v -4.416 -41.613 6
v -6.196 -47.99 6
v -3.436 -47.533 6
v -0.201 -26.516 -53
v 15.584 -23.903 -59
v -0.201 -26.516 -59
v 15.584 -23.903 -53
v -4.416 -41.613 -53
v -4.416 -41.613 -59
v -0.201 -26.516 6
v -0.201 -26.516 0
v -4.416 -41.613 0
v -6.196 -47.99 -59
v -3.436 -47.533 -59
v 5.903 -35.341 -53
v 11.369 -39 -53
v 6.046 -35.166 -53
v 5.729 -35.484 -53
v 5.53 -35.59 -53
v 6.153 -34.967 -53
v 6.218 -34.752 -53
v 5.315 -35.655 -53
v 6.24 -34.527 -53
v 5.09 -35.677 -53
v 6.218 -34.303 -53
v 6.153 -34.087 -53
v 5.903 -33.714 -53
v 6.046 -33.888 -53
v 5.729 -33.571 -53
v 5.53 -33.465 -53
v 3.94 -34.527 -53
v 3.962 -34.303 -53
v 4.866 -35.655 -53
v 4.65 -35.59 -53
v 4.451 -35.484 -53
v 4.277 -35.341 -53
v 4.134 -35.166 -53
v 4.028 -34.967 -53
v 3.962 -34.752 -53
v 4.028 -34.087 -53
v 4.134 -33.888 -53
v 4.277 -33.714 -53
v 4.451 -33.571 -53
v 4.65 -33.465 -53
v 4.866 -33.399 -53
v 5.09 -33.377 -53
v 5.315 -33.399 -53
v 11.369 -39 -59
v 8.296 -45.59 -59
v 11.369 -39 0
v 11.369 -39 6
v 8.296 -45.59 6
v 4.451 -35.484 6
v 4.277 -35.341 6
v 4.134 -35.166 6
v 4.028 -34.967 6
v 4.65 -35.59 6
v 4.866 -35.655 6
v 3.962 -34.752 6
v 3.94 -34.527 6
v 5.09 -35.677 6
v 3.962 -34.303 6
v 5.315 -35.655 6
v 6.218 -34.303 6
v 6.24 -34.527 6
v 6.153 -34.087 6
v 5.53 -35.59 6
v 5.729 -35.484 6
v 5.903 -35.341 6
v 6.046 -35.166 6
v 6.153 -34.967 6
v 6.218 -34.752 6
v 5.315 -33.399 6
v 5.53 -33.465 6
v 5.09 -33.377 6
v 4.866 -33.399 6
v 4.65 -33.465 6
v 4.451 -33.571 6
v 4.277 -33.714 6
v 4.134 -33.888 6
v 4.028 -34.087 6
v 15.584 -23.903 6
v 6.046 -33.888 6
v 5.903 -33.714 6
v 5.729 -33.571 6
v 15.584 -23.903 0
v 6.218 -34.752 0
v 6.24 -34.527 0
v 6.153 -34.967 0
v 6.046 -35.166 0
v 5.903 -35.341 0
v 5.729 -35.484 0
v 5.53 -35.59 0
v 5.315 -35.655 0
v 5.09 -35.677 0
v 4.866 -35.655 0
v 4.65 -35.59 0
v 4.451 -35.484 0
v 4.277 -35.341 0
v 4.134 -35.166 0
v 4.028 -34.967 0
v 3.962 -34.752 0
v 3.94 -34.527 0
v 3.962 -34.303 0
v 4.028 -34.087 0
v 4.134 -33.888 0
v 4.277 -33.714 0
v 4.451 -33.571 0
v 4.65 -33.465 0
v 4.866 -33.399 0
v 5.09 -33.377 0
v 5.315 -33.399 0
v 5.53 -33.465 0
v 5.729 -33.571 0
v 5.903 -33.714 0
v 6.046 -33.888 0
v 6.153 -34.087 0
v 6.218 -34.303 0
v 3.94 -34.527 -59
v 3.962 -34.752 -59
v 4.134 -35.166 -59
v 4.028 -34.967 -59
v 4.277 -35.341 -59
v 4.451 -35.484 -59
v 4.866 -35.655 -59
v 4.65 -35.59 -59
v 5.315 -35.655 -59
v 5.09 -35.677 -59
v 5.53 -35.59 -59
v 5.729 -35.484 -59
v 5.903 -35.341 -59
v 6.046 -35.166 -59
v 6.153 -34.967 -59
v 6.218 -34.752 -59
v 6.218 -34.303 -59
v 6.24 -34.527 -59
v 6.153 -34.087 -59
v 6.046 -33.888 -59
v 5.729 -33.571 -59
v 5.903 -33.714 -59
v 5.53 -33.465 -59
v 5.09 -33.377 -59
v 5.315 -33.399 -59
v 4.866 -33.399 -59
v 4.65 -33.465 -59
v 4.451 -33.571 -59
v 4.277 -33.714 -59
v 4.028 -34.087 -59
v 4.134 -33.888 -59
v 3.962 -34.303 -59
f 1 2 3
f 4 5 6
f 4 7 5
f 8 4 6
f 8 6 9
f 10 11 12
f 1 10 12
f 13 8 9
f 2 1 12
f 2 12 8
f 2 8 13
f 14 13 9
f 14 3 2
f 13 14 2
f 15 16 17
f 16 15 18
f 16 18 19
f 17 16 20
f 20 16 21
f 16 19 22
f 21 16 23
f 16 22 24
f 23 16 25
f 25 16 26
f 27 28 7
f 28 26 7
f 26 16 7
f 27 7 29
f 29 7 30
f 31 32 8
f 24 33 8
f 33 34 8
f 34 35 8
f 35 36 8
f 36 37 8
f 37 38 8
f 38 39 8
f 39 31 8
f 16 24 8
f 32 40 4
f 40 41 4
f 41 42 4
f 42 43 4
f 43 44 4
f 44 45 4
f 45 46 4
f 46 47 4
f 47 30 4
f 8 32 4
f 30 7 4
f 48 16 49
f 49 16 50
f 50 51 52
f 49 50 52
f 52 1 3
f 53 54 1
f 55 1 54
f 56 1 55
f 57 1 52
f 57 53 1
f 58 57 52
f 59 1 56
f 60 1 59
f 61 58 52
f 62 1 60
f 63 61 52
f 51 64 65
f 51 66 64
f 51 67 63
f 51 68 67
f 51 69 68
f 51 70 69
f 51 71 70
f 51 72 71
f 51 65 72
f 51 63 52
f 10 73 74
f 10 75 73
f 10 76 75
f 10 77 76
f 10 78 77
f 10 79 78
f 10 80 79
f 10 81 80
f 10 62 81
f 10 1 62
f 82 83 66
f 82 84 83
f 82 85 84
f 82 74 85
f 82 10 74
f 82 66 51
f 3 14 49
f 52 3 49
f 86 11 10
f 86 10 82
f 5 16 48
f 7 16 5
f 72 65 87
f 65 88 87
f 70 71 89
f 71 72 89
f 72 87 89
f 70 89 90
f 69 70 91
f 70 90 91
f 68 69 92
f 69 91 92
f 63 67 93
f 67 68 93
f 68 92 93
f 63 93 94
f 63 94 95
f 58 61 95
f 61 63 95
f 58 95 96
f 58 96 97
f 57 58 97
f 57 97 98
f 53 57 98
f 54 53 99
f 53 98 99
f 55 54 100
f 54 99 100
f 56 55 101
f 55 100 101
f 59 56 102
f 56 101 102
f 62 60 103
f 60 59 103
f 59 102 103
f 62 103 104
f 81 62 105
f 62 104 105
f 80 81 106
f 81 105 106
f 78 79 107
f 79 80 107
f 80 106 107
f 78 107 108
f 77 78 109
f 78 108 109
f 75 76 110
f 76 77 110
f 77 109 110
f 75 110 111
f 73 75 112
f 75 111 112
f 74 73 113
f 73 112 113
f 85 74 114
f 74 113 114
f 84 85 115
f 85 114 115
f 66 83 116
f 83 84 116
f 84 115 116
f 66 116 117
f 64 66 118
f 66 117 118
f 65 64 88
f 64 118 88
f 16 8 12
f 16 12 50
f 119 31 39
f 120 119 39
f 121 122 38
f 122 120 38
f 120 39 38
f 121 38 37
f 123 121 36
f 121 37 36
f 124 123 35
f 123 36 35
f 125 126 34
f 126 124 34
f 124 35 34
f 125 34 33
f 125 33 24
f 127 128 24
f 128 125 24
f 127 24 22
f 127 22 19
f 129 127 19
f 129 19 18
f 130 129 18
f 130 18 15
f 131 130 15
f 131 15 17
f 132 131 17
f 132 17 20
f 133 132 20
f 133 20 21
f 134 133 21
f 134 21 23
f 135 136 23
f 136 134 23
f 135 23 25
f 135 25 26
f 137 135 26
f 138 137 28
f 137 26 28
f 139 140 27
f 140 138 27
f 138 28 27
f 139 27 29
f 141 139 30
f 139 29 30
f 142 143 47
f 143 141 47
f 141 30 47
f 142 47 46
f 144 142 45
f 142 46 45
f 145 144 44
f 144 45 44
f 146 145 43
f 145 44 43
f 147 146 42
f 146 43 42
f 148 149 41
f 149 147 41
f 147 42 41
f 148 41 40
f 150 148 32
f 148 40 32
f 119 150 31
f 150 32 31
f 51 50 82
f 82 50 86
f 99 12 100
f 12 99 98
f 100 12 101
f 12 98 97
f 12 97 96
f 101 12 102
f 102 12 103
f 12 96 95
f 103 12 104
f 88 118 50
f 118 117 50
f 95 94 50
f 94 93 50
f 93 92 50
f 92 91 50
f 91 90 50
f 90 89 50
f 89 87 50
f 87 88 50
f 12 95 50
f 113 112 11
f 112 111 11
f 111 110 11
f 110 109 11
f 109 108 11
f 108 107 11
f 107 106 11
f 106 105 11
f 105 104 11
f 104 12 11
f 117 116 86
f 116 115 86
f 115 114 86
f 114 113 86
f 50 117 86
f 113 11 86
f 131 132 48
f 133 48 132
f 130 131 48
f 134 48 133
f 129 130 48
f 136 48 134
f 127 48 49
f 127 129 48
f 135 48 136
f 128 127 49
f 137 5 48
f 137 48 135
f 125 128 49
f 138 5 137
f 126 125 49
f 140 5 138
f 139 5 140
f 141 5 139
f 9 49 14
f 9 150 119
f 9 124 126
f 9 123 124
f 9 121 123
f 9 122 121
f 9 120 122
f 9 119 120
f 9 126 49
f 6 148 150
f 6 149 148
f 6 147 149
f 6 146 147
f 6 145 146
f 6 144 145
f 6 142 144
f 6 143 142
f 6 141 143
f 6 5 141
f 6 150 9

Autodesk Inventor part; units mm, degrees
ref_plane "YZ Plane" through (0, 0, 0) normal (1, 0, 0) x (0, 1, 0)
ref_plane "XZ Plane" through (0, 0, 0) normal (0, 1, 0) x (-1, 0, 0)
ref_plane "XY Plane" through (0, 0, 0) normal (0, 0, 1) x (1, 0, 0)
ref_plane "작업 평면1" through (0, 0, 0) normal (0, 0, 1) x (1, 0, 0)
sketch "스케치1" plane through (0, 0, 0) normal (0, 0, 1) x (1, 0, 0)
  circle A0 centre (5.0902, -34.5274) radius 1.15 projected
  arc A1 (-17.0321, 89.7044) -> (-16.6881, 73.0594) centre (-9.9807, 81.5241) ccw projected
  line L0 (-16.6881, 73.0594) -> (-0.201, -26.5164) projected
  line L1 (-0.201, -26.5164) -> (-4.4157, -41.6132) projected
  line L2 (-4.4157, -41.6132) -> (11.3694, -38.9996) projected
  line L3 (11.3694, -38.9996) -> (15.5841, -23.9028) projected
  line L4 (15.5841, -23.9028) -> (-0.903, 75.673) projected
  arc A2 (-0.903, 75.673) -> (-5.9423, 91.5406) centre (-9.9807, 81.5241) ccw projected
  arc A3 (-5.9423, 91.5406) -> (-7.3028, 90.4498) centre (-6.3162, 90.6132) ccw projected
  line L5 (-7.3028, 90.4498) -> (-5.9358, 82.1938) projected
  arc A4 (-14.0257, 80.8544) -> (-5.9358, 82.1938) centre (-9.9807, 81.5241) ccw projected
  line L6 (-14.0257, 80.8544) -> (-15.3926, 89.1104) projected
  arc A5 (-15.3926, 89.1104) -> (-17.0321, 89.7044) centre (-16.3792, 88.947) ccw projected
  circle A6 centre (-14.6376, 75.0192) radius 1.3 projected
  circle A7 centre (-3.4758, 76.8673) radius 1.3 projected
  circle A8 centre (-5.3239, 88.029) radius 1.3 projected
  circle A9 centre (-8.6739, 73.6316) radius 1.3 projected
  circle A10 centre (-2.0882, 82.8309) radius 1.3 projected
  circle A11 centre (-16.4857, 86.1809) radius 1.3 projected
  circle A12 centre (-17.8733, 80.2173) radius 1.3 projected
  line L7 (-0.201, -26.5164) -> (15.5841, -23.9028)
  point P0 (0, 0)
extrude "돌출1" add sketch "스케치1" along normal blind 6 contours L7 L3 L2 L1
ref_plane "작업 평면2" through (0, 0, -53) normal (0, 0, -1) x (-1, 0, 0)
sketch "스케치2" plane through (0, 0, -53) normal (0, 0, -1) x (-1, 0, 0)
  line L0 (4.4157, -41.6132) -> (-11.3694, -38.9996) projected
  line L1 (-11.3694, -38.9996) -> (-15.5841, -23.9028) projected
  line L2 (-15.5841, -23.9028) -> (0.201, -26.5164) projected
  line L3 (0.201, -26.5164) -> (4.4157, -41.6132) projected
  circle A0 centre (-5.0902, -34.5274) radius 1.15 projected
  point P0 (0, 0)
extrude "돌출2" add sketch "스케치2" along normal blind 6
sketch "스케치7" plane through (-4.4157, -41.6132, -59) normal (0.1633496, -0.9865682, 0) x (0.9865682, 0.1633496, 0)
  line L0 (16, 6) -> (0, 6) projected
  line L1 (0, 6) -> (0, 0) projected
  line L2 (16, 0) -> (0, 0) projected
  line L3 (16, 6) -> (16, 0) projected
  line L4 (0, 59) -> (16, 59) projected
  line L5 (16, 59) -> (16, 65) projected
  line L6 (0, 65) -> (16, 65) projected
  line L7 (0, 59) -> (0, 65) projected
  line L8 (16, 0) -> (0, 0) projected
  line L9 (0, 0) -> (16, 0)
  line L10 (16, 0) -> (16, 65)
  line L11 (16, 65) -> (0, 65)
  line L12 (0, 65) -> (0, 0)
  point P0 (11.1539, 59)
  point P1 (16, 6)
  point P2 (16, 59)
  point P3 (0, 6)
extrude "돌출4" add sketch "스케치7" along normal blind 6
sketch "스케치8" plane through (0, 0, 6) normal (0, 0, 1) x (1, 0, 0)
  line L0 (11.3694, -38.9996) -> (15.5841, -23.9028) projected
  line L1 (15.5841, -23.9028) -> (-0.201, -26.5164) projected
  line L2 (-0.201, -26.5164) -> (-4.4157, -41.6132) projected
  line L3 (-4.4157, -41.6132) -> (-3.4356, -47.5326) projected
  line L4 (12.3495, -44.919) -> (-3.4356, -47.5326) projected
  line L5 (11.3694, -38.9996) -> (12.3495, -44.919) projected
  circle A0 centre (5.0902, -34.5274) radius 1.15 projected
  line L6 (11.3694, -38.9996) -> (8.2961, -45.5901)
  line L7 (11.3694, -38.9996) -> (19.8926, -38.9996) construction
  point P0 (0, 0)
  dimension "d8" = 115
extrude "돌출5" cut sketch "스케치8" against normal blind 70 contours L5 L4 L6
sketch "스케치9" plane through (0, 0, 6) normal (0, 0, 1) x (1, 0, 0)
  circle A0 centre (5.0902, -34.5274) radius 1.15 projected
  line L0 (8.2961, -45.5901) -> (11.3694, -38.9996) projected
  line L1 (11.3694, -38.9996) -> (15.5841, -23.9028) projected
  line L2 (15.5841, -23.9028) -> (-0.201, -26.5164) projected
  line L3 (-0.201, -26.5164) -> (-4.4157, -41.6132) projected
  line L4 (-4.4157, -41.6132) -> (-3.4356, -47.5326) projected
  line L5 (8.2961, -45.5901) -> (-3.4356, -47.5326) projected
  line L6 (-4.4157, -41.6132) -> (-7.6705, -53.2716)
  line L7 (3.9402, -46.3113) -> (-21.3119, -50.4924)
  point P0 (0, 0)
  point P1 (-6.1959, -47.9896)
extrude "돌출6" add sketch "스케치9" against normal blind 65 contours L7 L6 L4
properties part number "70" material "LCP 플라스틱"
